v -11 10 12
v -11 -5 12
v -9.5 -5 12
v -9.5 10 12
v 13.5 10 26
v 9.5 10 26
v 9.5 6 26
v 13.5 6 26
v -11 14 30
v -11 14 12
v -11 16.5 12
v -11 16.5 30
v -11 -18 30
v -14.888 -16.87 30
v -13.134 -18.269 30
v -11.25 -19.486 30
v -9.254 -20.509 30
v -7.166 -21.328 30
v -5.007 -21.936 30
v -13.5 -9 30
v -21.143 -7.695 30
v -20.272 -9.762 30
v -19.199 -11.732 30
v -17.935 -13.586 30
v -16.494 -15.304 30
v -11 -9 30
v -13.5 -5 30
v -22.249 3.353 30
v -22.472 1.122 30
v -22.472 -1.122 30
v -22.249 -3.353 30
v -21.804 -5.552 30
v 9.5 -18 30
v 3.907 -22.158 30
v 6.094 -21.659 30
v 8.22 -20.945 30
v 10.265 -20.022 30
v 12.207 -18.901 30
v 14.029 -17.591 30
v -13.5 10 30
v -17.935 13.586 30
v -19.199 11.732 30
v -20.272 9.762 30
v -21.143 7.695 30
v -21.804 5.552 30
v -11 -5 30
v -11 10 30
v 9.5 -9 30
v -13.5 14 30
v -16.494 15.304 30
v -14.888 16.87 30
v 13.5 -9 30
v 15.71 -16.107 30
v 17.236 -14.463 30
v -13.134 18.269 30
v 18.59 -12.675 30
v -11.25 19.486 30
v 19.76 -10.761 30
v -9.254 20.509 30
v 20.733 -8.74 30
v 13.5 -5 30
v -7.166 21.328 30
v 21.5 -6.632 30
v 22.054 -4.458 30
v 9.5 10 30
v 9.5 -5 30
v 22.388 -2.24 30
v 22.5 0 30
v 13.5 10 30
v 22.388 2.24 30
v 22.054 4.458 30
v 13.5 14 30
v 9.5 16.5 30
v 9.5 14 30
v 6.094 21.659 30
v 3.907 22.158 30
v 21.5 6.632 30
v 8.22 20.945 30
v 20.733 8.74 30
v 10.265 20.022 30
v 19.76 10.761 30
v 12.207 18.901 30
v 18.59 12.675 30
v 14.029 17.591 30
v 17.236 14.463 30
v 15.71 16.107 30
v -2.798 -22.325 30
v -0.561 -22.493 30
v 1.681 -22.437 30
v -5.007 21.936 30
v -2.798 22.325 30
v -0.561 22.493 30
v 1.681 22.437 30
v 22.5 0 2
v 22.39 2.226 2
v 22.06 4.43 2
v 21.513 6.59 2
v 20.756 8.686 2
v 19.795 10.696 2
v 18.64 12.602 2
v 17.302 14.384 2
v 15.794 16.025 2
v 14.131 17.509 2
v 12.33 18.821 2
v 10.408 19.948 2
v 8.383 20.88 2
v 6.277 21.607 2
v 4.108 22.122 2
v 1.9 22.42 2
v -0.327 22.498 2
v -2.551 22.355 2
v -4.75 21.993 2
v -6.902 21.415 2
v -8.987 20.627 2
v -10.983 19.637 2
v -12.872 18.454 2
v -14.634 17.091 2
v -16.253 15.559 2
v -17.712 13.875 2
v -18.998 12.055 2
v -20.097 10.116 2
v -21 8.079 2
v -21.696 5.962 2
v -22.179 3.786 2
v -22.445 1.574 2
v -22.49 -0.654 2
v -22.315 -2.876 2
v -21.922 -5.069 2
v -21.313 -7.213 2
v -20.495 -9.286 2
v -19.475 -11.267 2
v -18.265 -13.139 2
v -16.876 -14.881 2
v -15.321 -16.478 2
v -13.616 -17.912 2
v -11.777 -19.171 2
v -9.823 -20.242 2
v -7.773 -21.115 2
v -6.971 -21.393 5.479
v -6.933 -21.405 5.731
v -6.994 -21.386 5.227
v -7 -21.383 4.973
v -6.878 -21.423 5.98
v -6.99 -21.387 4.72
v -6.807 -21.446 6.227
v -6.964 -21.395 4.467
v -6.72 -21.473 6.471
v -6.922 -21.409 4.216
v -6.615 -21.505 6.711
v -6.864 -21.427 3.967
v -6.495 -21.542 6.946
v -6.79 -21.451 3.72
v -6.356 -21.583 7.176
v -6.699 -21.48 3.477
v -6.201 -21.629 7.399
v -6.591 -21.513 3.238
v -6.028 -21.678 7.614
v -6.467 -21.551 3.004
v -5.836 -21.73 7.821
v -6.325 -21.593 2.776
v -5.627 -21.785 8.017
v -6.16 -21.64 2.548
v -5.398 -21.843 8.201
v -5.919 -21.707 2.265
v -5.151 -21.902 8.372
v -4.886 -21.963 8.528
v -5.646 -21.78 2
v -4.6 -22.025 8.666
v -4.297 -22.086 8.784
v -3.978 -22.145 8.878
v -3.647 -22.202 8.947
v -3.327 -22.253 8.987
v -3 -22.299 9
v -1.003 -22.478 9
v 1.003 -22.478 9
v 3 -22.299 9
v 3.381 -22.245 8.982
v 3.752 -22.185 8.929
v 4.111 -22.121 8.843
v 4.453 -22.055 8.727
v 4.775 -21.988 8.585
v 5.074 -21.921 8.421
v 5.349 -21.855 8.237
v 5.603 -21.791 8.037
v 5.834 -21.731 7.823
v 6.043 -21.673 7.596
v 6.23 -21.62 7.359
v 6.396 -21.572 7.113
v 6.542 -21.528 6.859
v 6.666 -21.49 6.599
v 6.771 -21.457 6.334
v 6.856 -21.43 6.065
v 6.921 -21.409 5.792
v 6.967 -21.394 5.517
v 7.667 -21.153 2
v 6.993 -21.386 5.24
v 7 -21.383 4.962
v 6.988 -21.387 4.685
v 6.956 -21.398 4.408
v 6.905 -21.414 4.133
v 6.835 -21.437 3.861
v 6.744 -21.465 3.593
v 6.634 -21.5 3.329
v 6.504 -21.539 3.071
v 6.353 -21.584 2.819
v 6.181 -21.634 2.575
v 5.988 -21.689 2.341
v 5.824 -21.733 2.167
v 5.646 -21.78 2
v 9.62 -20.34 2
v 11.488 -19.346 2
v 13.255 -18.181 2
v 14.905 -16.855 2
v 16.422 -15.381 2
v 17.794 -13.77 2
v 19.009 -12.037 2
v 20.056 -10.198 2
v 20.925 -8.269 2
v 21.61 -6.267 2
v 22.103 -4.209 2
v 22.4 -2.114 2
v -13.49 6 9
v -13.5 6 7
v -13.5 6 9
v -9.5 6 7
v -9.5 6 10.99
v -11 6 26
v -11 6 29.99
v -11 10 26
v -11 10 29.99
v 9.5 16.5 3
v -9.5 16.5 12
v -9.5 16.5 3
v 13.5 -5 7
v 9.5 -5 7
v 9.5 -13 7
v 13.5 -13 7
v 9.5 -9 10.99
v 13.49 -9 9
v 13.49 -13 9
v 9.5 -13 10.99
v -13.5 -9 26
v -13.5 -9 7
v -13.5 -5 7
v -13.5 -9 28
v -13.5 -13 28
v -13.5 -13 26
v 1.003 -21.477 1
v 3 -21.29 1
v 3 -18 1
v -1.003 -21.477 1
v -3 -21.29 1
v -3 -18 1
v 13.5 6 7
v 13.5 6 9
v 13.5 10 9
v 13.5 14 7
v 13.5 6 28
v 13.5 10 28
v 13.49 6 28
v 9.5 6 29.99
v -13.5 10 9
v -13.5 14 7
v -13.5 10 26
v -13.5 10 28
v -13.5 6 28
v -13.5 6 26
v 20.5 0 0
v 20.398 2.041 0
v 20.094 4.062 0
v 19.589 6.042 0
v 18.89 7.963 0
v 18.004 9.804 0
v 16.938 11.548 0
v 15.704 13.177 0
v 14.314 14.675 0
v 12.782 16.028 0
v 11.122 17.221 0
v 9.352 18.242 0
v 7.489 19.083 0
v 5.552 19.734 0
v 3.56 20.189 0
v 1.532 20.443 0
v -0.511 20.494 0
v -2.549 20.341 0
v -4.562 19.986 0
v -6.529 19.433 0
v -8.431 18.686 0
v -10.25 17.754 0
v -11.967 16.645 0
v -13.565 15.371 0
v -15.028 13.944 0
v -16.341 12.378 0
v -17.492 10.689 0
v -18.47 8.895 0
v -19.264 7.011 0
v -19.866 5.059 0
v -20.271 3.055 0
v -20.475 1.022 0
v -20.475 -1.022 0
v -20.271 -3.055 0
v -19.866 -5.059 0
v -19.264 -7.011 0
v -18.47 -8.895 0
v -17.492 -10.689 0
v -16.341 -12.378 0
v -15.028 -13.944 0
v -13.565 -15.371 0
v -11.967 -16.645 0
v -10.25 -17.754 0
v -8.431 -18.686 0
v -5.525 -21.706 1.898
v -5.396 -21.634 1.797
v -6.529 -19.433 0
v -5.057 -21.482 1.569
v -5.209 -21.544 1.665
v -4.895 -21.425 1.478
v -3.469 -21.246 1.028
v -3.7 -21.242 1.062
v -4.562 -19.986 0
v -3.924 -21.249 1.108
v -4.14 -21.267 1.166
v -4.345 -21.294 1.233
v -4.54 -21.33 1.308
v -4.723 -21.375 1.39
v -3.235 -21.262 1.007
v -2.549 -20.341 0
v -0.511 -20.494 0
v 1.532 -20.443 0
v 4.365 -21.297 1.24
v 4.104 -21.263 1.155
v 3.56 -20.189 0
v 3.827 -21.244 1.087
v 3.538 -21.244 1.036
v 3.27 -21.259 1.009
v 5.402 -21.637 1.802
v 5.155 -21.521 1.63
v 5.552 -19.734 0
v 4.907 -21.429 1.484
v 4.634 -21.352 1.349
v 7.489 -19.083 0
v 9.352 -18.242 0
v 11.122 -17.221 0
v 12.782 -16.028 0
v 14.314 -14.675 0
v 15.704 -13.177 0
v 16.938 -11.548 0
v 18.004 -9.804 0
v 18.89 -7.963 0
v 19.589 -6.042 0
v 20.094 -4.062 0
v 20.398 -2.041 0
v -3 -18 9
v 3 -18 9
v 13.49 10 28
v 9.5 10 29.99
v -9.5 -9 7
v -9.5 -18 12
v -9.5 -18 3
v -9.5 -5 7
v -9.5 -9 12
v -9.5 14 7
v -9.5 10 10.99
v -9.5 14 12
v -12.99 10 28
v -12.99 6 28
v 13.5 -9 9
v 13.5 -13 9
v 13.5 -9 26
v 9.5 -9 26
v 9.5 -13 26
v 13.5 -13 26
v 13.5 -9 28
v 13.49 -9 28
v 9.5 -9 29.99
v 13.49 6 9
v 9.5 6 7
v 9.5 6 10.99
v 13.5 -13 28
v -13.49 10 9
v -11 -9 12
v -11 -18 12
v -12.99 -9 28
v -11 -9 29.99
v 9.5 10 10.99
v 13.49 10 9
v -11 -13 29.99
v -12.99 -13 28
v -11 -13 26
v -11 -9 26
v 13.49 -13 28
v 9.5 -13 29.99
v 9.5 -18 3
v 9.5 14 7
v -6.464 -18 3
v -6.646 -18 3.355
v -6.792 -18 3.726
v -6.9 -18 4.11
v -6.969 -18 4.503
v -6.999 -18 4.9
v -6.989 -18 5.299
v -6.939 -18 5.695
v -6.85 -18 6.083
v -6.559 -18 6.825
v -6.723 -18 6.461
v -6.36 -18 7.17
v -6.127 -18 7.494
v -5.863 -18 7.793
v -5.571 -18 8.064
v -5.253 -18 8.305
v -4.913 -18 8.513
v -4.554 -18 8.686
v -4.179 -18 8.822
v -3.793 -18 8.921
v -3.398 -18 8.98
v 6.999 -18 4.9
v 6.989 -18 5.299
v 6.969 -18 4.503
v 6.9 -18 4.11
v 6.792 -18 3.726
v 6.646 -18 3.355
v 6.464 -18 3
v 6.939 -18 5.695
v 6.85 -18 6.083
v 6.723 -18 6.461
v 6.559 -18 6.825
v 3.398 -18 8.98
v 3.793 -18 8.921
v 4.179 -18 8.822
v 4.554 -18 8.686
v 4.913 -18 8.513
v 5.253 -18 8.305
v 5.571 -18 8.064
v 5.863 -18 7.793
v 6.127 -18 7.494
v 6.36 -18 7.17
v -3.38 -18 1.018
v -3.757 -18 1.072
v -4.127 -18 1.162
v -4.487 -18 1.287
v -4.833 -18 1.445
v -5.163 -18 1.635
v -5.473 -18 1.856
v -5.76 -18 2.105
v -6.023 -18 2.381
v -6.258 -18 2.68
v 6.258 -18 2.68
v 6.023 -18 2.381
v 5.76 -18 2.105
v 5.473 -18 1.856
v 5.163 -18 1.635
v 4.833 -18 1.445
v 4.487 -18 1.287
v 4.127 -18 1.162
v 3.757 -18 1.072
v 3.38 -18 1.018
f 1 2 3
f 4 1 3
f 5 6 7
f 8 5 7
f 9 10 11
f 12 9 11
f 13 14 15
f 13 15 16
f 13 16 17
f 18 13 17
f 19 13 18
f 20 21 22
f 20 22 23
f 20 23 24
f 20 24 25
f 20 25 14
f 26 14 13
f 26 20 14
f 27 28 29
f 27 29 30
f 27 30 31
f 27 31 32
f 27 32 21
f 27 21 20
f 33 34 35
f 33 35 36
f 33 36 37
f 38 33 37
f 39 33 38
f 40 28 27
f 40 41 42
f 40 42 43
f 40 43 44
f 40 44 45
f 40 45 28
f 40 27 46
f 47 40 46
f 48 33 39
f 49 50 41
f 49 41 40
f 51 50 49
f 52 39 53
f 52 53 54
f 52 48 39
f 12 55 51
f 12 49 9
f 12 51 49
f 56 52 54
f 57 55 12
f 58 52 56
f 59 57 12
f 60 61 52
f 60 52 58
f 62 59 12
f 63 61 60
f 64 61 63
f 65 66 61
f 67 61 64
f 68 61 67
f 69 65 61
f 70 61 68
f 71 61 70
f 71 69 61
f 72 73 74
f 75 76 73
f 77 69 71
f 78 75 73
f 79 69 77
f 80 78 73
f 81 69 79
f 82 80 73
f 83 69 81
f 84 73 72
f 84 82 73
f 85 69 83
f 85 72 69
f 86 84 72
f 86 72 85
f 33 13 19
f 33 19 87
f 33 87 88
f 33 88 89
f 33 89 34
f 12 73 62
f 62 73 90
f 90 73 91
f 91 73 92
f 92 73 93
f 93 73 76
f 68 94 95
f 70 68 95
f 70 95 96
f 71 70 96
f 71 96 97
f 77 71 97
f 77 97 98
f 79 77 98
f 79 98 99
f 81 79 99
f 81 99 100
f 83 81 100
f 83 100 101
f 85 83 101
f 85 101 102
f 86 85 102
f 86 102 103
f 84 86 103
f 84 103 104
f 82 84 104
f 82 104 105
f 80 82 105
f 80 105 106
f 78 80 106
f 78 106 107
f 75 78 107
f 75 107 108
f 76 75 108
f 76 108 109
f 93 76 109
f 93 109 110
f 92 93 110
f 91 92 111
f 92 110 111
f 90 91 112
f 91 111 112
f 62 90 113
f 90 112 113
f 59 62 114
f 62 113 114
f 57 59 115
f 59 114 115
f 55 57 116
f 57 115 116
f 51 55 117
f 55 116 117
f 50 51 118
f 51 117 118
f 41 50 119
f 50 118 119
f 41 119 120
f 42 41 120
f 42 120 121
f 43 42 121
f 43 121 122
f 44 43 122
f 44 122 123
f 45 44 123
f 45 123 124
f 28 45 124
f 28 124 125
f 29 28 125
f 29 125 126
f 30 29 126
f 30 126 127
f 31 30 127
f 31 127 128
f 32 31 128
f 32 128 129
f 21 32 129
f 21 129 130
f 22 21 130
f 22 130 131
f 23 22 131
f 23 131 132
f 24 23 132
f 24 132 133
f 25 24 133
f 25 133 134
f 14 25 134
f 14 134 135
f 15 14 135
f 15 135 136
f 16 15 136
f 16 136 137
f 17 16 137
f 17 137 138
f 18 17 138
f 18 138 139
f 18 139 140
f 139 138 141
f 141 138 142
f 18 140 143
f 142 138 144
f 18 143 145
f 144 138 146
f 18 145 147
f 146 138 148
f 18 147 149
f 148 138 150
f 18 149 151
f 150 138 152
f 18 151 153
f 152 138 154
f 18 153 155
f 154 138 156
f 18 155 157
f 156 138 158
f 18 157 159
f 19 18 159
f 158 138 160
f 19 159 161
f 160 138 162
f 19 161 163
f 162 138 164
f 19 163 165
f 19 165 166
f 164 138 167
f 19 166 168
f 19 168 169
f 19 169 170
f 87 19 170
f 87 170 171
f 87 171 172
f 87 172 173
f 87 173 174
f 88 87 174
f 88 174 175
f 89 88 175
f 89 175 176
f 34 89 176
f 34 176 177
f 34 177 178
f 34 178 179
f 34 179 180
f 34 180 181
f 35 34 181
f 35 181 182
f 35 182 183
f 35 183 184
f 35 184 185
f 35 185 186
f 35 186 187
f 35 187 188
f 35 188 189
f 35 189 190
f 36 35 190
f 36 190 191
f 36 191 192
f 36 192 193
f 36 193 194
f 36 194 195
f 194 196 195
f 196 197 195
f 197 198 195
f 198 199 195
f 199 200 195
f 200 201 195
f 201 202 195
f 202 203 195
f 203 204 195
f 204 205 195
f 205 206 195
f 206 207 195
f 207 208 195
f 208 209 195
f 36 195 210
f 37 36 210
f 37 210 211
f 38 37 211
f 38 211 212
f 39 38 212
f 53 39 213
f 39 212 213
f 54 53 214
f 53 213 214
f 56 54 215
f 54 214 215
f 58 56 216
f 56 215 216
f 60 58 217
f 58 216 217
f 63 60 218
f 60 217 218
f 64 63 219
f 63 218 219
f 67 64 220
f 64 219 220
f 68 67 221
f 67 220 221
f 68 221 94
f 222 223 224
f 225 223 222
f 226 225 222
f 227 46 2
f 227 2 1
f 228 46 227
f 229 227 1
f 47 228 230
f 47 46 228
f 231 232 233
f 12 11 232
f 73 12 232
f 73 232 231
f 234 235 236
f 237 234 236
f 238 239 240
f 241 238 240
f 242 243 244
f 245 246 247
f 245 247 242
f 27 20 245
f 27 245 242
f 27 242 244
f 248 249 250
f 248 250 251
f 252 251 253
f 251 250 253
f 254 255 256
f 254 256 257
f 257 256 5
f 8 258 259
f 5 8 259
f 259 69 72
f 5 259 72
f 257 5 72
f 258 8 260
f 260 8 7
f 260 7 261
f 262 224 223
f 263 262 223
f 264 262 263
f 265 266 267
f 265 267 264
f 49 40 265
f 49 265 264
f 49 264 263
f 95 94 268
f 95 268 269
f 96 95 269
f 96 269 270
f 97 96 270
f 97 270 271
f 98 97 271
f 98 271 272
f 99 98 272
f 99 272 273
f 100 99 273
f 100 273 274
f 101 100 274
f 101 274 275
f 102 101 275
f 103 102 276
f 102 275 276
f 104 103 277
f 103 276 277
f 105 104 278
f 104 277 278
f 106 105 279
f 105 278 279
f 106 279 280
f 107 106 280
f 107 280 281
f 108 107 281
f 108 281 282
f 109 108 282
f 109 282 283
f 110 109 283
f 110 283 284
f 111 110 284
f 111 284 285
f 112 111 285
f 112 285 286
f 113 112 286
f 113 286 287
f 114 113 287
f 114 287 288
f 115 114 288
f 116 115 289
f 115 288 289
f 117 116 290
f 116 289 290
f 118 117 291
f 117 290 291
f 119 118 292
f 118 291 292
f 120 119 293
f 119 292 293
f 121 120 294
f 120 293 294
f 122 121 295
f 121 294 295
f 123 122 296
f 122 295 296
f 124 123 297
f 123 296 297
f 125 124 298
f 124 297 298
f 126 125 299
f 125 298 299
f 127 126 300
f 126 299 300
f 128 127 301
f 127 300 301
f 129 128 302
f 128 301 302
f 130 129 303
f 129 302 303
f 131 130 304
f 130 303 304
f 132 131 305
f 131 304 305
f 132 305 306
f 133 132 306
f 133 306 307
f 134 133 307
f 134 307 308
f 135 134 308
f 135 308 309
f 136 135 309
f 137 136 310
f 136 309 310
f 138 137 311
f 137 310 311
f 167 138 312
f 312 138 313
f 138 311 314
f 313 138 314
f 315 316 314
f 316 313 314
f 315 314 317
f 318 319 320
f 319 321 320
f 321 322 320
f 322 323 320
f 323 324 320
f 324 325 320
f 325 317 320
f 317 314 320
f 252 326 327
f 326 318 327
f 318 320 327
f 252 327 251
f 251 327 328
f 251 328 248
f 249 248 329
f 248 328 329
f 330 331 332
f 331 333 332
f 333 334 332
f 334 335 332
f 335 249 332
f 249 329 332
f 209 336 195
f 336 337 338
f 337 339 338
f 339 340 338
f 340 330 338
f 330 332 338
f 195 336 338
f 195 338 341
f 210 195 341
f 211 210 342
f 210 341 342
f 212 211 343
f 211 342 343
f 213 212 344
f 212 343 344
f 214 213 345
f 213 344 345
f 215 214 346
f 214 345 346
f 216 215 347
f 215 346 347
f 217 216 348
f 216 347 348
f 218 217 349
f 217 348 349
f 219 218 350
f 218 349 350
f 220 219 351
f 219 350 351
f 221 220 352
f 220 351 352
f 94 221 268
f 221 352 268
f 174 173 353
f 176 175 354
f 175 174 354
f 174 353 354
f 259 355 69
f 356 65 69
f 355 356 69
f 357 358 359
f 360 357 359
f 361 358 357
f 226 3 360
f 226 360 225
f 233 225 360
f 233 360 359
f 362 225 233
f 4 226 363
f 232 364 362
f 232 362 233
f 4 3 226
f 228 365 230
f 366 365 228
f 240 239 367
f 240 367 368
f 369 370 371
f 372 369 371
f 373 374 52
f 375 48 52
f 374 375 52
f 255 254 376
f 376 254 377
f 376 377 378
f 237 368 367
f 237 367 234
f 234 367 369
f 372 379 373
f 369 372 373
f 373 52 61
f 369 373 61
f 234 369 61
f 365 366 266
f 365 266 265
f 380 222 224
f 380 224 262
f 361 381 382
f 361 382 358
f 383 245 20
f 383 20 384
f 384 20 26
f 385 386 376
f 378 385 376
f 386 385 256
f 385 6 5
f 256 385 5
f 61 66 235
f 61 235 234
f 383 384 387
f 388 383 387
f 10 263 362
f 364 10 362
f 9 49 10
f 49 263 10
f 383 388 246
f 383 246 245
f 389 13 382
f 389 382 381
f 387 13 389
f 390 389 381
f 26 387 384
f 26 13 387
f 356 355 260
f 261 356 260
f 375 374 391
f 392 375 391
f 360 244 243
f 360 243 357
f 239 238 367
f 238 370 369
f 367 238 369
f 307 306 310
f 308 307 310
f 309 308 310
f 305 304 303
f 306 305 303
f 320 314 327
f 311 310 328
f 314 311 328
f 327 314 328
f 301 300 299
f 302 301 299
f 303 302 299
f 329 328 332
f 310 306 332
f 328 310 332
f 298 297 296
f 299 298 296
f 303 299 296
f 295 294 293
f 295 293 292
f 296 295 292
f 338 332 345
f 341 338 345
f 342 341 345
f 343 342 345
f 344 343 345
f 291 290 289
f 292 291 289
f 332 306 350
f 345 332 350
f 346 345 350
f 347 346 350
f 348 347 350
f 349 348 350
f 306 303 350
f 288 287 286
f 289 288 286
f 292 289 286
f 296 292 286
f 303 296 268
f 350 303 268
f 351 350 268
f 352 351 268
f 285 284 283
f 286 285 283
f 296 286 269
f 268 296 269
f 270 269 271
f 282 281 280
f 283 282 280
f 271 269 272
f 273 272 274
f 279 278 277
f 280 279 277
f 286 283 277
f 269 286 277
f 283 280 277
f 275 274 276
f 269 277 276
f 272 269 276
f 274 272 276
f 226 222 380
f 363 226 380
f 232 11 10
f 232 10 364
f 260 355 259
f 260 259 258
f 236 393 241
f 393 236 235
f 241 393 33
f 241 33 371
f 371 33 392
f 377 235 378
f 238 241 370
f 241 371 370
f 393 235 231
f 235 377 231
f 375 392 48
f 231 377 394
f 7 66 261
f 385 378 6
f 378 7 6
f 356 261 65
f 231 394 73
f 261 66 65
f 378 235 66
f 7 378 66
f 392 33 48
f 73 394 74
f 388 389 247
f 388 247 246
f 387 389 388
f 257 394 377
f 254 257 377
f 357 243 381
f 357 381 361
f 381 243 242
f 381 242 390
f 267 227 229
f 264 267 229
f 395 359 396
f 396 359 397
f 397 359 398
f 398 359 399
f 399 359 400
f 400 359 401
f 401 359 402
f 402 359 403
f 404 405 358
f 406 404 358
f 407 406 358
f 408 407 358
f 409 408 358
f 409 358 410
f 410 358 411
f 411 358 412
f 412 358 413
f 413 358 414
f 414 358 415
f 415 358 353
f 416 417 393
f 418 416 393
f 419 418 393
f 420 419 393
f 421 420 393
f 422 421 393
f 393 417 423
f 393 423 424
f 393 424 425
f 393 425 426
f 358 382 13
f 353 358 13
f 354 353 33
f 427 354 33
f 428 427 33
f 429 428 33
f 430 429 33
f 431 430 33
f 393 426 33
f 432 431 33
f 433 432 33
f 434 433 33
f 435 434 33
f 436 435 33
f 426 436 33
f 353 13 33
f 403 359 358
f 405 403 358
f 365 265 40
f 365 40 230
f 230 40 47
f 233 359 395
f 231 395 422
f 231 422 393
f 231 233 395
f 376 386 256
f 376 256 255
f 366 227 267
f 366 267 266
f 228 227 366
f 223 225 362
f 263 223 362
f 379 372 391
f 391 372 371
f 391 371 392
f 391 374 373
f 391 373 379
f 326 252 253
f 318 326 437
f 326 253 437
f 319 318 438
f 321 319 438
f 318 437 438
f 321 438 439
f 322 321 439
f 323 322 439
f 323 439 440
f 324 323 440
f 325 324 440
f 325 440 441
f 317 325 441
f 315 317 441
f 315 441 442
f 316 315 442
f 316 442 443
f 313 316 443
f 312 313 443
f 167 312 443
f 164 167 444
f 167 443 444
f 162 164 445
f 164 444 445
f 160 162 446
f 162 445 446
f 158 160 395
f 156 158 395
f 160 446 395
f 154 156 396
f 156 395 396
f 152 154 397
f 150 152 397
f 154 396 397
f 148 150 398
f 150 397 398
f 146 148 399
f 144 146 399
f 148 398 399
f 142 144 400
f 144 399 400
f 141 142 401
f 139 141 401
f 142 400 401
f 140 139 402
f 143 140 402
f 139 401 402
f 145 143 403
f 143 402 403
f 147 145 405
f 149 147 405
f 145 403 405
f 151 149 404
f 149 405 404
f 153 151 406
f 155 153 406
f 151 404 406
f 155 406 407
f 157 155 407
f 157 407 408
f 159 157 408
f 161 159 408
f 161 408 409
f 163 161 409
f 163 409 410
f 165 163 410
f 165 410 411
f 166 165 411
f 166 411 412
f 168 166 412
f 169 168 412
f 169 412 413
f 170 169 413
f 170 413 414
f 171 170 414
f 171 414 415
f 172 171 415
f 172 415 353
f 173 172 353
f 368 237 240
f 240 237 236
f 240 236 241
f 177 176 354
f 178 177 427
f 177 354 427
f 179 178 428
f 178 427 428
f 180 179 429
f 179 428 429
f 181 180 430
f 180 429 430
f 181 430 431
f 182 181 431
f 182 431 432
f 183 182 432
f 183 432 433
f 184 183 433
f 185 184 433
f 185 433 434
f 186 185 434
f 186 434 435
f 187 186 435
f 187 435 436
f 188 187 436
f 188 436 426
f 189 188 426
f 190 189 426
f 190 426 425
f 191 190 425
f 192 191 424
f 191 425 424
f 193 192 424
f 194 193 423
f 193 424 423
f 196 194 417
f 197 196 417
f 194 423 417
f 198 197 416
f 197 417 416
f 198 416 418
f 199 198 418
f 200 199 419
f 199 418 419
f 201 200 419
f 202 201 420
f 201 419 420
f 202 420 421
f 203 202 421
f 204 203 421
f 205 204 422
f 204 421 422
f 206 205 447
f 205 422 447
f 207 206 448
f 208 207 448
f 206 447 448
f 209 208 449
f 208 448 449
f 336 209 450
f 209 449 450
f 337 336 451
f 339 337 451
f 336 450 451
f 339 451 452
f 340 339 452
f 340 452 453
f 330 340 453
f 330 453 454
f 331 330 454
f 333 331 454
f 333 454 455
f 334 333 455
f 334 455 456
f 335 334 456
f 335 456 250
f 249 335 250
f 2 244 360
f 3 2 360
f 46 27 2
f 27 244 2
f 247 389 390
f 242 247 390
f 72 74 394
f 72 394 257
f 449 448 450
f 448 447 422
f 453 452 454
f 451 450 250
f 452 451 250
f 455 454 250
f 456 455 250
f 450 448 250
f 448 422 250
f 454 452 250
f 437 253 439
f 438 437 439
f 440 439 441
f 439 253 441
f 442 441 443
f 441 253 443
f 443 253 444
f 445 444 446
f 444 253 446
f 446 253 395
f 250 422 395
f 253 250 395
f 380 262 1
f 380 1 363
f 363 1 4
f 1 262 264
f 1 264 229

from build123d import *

# Parameters (mm, degrees)
SKETCH025_R     = 22.5
PAD008_DEPTH    = 30
CHAMFER006_SIZE = 2
SKETCH026_W     = 19
SKETCH026_H     = 34.5
POCKET016_DEPTH = 27
POCKET017_DEPTH = 5
SKETCH028_W     = 4
SKETCH028_H     = 4
POCKET018_DEPTH = 23
SKETCH029_W     = 4
SKETCH029_H     = 2
POCKET019_DEPTH = 4
SKETCH030_W     = 4
SKETCH030_H     = 2
POCKET020_DEPTH = 4
SKETCH034_W     = 11
SKETCH034_H     = 34.5
POCKET_DEPTH    = 18
CHAMFER_1_SIZE2 = 3.99
CHAMFER_1_SIZE  = 1.99
CHAMFER_2_SIZE2 = 3.99
CHAMFER_2_SIZE  = 1.99
CHAMFER007_SIZE = 1.99


with BuildPart() as part:
    # Sketch025 → Pad008 (new body)
    with BuildSketch(Plane.XY):
        Circle(SKETCH025_R)
    extrude(amount=PAD008_DEPTH)

    # Chamfer006
    chamfer006_edges = [part.edges().sort_by_distance(p)[0] for p in [
        (-22.5, 0, 0),
    ]]
    chamfer(chamfer006_edges, length=CHAMFER006_SIZE)

    # Sketch026 (on Face3 of Chamfer006) → Pocket016 (cut)
    with BuildSketch(Plane.XY.offset(30)):
        with Locations((0, -0.75)):
            Rectangle(SKETCH026_W, SKETCH026_H)
    extrude(amount=-POCKET016_DEPTH, mode=Mode.SUBTRACT)

    # Sketch027 (on Face6 of Pocket016) → Pocket017 (cut)
    with BuildSketch(Plane(origin=(0, -18, 0), x_dir=(-1, 0, 0), z_dir=(0, 1, 0))):
        with BuildLine():
            ThreePointArc((-3, 9), (-7, 5), (-3, 1))
            Line((-3, 1), (3, 1))
            ThreePointArc((3, 1), (7, 5), (3, 9))
            Line((3, 9), (-3, 9))
        make_face()
    extrude(amount=-POCKET017_DEPTH, mode=Mode.SUBTRACT)

    # Sketch028 (on Face6 of Pocket017) → Pocket018 (cut)
    with BuildSketch(Plane.XY.offset(30)):
        with Locations((-11.5, 12)):
            Rectangle(SKETCH028_W, SKETCH028_H)
        with Locations((-11.5, -7)):
            Rectangle(SKETCH028_W, SKETCH028_H)
        with Locations((11.5, -7)):
            Rectangle(SKETCH028_W, SKETCH028_H)
        with Locations((11.5, 12)):
            Rectangle(SKETCH028_W, SKETCH028_H)
    extrude(amount=-POCKET018_DEPTH, mode=Mode.SUBTRACT)

    # Sketch029 (on Face19 of Pocket018) → Pocket019 (cut)
    with BuildSketch(Plane.YZ.offset(-9.5)):
        with Locations((-11, 27)):
            Rectangle(SKETCH029_W, SKETCH029_H)
        with Locations((8, 27)):
            Rectangle(SKETCH029_W, SKETCH029_H)
        with Locations((8, 8)):
            Rectangle(SKETCH029_W, SKETCH029_H)
    extrude(amount=-POCKET019_DEPTH, mode=Mode.SUBTRACT)

    # Sketch030 (on Face11 of Pocket019) → Pocket020 (cut)
    with BuildSketch(Plane(origin=(9.5, 0, 0), x_dir=(0, -1, 0), z_dir=(-1, 0, 0))):
        with Locations((-8, 8)):
            Rectangle(SKETCH030_W, SKETCH030_H)
        with Locations((-8, 27)):
            Rectangle(SKETCH030_W, SKETCH030_H)
        with Locations((11, 8)):
            Rectangle(SKETCH030_W, SKETCH030_H)
        with Locations((11, 27)):
            Rectangle(SKETCH030_W, SKETCH030_H)
    extrude(amount=-POCKET020_DEPTH, mode=Mode.SUBTRACT)

    # Sketch034 (on Face6 of Pocket020) → Pocket (cut)
    with BuildSketch(Plane.XY.offset(30)):
        with Locations((-5.5, -0.75)):
            Rectangle(SKETCH034_W, SKETCH034_H)
    extrude(amount=-POCKET_DEPTH, mode=Mode.SUBTRACT)

    # Chamfer 1
    chamfer_1_edges = [part.edges().sort_by_distance(p)[0] for p in [
        (9.5, 8, 28),
        (9.5, -11, 28),
        (9.5, -11, 9),
        (9.5, 8, 9),
    ]]
    chamfer_1_side = part.faces().sort_by_distance((9.5, -1.552236, 15.94095))[0]
    chamfer(chamfer_1_edges, length=CHAMFER_1_SIZE, length2=CHAMFER_1_SIZE2, reference=chamfer_1_side)

    # Chamfer 2
    chamfer_2_edges = [part.edges().sort_by_distance(p)[0] for p in [
        (-9.5, 8, 9),
    ]]
    chamfer_2_side = part.faces().sort_by_distance((-9.5, -1.511905, 7.18))[0]
    chamfer(chamfer_2_edges, length=CHAMFER_2_SIZE, length2=CHAMFER_2_SIZE2, reference=chamfer_2_side)

    # Chamfer007
    chamfer007_edges = [part.edges().sort_by_distance(p)[0] for p in [
        (-11, 8, 28),
        (-11, -11, 28),
    ]]
    chamfer(chamfer007_edges, length=CHAMFER007_SIZE)


solid = part.part
